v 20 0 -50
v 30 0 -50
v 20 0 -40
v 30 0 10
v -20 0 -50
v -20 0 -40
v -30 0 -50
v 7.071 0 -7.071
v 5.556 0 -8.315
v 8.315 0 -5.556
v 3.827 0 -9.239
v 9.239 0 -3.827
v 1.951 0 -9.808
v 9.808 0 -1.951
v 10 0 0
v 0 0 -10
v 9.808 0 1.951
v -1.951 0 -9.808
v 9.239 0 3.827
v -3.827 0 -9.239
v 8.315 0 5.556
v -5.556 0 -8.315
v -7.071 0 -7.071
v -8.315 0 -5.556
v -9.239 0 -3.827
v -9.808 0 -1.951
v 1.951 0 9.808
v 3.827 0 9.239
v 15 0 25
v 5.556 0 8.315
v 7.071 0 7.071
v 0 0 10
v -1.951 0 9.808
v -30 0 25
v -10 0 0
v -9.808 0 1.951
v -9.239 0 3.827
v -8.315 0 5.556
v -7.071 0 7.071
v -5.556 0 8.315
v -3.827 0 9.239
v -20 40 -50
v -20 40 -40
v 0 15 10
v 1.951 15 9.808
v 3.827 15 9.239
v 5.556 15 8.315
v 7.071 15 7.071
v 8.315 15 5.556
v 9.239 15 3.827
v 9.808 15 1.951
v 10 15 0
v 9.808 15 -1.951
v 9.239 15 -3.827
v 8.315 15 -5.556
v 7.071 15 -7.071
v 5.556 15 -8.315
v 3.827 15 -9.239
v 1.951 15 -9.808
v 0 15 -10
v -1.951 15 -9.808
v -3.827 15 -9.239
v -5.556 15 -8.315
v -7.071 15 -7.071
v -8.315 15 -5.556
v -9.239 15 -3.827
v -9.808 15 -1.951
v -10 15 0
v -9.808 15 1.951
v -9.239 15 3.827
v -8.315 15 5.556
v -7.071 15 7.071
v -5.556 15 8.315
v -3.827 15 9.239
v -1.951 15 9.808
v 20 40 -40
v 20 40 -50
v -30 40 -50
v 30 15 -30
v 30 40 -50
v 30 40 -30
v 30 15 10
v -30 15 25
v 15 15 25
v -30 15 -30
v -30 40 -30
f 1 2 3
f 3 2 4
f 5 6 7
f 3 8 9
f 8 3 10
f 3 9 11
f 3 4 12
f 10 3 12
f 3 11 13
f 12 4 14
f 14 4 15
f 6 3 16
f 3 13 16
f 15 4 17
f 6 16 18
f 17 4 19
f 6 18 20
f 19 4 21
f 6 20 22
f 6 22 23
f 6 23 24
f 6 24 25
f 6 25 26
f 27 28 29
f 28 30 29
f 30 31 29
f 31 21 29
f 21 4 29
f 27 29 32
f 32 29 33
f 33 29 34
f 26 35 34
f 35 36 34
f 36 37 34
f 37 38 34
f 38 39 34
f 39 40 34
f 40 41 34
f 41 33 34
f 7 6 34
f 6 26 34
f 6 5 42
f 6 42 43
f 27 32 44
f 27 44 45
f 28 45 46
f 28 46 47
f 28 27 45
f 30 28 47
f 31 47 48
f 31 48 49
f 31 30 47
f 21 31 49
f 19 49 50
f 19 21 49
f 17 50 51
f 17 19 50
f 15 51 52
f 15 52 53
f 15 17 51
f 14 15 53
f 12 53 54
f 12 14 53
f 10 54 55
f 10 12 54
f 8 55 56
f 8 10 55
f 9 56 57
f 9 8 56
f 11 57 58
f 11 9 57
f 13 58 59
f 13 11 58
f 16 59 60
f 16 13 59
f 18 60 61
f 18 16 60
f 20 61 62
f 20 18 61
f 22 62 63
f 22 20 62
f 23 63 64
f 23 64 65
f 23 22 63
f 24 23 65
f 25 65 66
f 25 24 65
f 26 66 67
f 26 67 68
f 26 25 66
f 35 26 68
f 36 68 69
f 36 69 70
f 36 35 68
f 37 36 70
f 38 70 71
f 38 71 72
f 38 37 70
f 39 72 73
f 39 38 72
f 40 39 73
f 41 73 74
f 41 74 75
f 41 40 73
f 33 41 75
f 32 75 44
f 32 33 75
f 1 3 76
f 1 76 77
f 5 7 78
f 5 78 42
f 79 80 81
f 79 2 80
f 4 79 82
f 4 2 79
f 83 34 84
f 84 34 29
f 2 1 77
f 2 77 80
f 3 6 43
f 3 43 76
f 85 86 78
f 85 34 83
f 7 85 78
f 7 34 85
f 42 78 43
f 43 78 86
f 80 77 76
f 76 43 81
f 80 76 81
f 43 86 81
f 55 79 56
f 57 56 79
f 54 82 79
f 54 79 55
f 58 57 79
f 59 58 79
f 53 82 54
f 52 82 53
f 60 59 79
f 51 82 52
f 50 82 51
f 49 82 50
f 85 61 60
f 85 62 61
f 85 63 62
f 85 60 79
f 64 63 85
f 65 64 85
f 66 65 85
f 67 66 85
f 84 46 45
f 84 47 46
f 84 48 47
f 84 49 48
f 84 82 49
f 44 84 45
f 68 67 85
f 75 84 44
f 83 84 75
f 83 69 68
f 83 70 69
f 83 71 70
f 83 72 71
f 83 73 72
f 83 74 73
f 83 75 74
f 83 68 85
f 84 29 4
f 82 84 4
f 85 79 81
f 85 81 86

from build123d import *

# Parameters (mm, degrees)
SKETCH1_R           = 10
BOSS_EXTRUDE1_DEPTH = 15
BOSS_EXTRUDE2_DEPTH = 25
SKETCH3_W           = 40
SKETCH3_H           = 10
CUT_EXTRUDE1_DEPTH  = 71.710678119


with BuildPart() as part:
    # Sketch1 → Boss-Extrude1 (new body)
    with BuildSketch(Plane(origin=(0, 0, 0), x_dir=(-1, 0, 0), z_dir=(0, 1, 0))):
        Polygon((-30, -50), (30, -50), (30, 25), (-15, 25), (-30, 10), align=None)
        with Locations(Location((0, 0, 0), (0, 0, 90))):
            Circle(SKETCH1_R, mode=Mode.SUBTRACT)
    extrude(amount=BOSS_EXTRUDE1_DEPTH)

    # Sketch2 → Boss-Extrude2 (add)
    with BuildSketch(Plane(origin=(0, 15, 0), x_dir=(-1, 0, 0), z_dir=(0, 1, 0))):
        Polygon((-30, -50), (-30, -30), (30, -30), (30, -50), (20, -50), (20, -40), (-20, -40), (-20, -50), align=None)
    extrude(amount=BOSS_EXTRUDE2_DEPTH)

    # Sketch3 → Cut-Extrude1 (cut, through all)
    with BuildSketch(Plane(origin=(0, 40, 0), x_dir=(-1, 0, 0), z_dir=(0, 1, 0))):
        with Locations((0, -45)):
            Rectangle(SKETCH3_W, SKETCH3_H)
    extrude(amount=-CUT_EXTRUDE1_DEPTH, mode=Mode.SUBTRACT)


solid = part.part
